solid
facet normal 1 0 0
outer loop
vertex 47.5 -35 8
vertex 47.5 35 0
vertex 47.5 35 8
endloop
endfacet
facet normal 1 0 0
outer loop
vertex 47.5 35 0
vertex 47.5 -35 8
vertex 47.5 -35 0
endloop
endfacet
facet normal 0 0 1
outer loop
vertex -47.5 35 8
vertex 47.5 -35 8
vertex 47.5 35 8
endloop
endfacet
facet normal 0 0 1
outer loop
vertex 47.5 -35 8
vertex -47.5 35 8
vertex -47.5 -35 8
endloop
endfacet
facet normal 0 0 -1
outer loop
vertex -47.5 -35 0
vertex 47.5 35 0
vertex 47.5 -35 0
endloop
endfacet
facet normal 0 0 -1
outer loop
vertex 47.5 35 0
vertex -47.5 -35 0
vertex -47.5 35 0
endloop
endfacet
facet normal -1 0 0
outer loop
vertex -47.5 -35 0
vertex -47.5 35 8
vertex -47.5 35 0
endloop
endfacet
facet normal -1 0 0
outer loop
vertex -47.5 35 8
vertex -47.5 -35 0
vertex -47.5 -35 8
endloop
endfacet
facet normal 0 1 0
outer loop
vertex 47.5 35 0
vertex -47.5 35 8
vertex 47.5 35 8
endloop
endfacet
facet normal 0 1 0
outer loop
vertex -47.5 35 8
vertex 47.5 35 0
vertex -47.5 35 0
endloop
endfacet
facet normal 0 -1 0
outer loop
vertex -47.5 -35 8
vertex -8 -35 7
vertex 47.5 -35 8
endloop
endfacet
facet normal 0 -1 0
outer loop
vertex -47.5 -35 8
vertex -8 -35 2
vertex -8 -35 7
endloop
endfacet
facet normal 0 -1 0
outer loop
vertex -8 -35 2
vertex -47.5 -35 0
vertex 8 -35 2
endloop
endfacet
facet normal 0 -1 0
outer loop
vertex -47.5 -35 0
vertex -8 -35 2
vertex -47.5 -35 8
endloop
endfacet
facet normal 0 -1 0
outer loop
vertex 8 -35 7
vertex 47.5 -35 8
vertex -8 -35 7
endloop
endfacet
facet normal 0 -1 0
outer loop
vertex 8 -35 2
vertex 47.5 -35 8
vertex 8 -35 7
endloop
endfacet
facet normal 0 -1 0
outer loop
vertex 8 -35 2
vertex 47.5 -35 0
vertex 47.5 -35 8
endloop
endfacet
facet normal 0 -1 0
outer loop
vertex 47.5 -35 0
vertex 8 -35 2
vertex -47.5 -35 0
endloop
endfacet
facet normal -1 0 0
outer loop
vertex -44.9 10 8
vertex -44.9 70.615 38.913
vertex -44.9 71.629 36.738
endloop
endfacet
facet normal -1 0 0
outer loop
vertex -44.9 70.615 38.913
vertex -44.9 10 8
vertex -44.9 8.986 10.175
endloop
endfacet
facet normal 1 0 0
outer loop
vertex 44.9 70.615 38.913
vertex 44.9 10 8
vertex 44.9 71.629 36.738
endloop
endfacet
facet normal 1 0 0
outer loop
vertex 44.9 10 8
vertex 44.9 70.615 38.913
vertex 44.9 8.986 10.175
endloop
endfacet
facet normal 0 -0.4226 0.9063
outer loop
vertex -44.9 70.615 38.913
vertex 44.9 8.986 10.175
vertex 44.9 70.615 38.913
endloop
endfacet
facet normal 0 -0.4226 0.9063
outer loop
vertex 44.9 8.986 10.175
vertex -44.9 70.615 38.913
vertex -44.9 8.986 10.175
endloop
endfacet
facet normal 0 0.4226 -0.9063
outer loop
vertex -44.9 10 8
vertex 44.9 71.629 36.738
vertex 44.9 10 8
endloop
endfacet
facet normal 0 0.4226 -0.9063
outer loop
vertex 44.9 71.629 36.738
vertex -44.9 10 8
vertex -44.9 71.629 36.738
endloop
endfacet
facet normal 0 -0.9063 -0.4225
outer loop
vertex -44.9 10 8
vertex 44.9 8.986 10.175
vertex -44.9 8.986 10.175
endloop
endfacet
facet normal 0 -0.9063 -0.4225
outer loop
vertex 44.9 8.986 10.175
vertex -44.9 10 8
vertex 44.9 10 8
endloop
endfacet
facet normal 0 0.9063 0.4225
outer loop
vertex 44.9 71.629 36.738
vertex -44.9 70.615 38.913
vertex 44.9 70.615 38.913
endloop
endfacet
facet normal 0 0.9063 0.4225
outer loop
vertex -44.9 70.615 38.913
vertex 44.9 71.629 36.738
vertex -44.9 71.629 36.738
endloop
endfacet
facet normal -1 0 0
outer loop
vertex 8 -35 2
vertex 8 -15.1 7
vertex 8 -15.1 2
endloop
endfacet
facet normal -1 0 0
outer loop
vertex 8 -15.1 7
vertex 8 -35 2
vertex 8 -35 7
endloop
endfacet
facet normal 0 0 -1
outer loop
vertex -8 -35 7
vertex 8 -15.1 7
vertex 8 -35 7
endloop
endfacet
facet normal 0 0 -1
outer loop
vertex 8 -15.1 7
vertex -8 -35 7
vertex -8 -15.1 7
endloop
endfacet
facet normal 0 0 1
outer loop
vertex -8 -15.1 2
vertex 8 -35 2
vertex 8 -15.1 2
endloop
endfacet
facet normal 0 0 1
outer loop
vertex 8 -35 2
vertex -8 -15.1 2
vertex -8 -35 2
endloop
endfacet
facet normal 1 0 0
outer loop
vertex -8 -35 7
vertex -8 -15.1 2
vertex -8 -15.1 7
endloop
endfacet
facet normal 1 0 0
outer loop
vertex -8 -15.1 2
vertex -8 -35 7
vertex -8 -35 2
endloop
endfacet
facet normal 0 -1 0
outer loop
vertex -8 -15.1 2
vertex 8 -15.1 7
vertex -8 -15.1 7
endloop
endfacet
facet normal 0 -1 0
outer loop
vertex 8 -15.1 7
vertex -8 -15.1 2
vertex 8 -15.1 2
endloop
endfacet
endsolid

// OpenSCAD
// Aether Dash S35 — parametric angled stand (draft)
// Units: mm

display_w = 85;
display_h = 58;
display_t = 6;
angle_deg = 65;
base_w = 95;
base_d = 70;
base_t = 8;
wall = 2.4;

module wedge_stand() {
  difference() {
    union() {
      // base
      translate([-base_w/2, -base_d/2, 0])
        cube([base_w, base_d, base_t]);

      // angled back support
      translate([0, 10, base_t])
        rotate([90 - angle_deg, 0, 0])
          translate([-display_w/2 - wall, 0, 0])
            cube([display_w + 2*wall, display_h + 10, wall]);
    }

    // cable channel
    translate([-8, -base_d/2 - 0.1, 2])
      cube([16, 20, 5]);
  }
}

wedge_stand();

// TODO Phase 2:
// - snap/fit for display bezel
// - encoder cutout coordinates
// - weighted base cavity
